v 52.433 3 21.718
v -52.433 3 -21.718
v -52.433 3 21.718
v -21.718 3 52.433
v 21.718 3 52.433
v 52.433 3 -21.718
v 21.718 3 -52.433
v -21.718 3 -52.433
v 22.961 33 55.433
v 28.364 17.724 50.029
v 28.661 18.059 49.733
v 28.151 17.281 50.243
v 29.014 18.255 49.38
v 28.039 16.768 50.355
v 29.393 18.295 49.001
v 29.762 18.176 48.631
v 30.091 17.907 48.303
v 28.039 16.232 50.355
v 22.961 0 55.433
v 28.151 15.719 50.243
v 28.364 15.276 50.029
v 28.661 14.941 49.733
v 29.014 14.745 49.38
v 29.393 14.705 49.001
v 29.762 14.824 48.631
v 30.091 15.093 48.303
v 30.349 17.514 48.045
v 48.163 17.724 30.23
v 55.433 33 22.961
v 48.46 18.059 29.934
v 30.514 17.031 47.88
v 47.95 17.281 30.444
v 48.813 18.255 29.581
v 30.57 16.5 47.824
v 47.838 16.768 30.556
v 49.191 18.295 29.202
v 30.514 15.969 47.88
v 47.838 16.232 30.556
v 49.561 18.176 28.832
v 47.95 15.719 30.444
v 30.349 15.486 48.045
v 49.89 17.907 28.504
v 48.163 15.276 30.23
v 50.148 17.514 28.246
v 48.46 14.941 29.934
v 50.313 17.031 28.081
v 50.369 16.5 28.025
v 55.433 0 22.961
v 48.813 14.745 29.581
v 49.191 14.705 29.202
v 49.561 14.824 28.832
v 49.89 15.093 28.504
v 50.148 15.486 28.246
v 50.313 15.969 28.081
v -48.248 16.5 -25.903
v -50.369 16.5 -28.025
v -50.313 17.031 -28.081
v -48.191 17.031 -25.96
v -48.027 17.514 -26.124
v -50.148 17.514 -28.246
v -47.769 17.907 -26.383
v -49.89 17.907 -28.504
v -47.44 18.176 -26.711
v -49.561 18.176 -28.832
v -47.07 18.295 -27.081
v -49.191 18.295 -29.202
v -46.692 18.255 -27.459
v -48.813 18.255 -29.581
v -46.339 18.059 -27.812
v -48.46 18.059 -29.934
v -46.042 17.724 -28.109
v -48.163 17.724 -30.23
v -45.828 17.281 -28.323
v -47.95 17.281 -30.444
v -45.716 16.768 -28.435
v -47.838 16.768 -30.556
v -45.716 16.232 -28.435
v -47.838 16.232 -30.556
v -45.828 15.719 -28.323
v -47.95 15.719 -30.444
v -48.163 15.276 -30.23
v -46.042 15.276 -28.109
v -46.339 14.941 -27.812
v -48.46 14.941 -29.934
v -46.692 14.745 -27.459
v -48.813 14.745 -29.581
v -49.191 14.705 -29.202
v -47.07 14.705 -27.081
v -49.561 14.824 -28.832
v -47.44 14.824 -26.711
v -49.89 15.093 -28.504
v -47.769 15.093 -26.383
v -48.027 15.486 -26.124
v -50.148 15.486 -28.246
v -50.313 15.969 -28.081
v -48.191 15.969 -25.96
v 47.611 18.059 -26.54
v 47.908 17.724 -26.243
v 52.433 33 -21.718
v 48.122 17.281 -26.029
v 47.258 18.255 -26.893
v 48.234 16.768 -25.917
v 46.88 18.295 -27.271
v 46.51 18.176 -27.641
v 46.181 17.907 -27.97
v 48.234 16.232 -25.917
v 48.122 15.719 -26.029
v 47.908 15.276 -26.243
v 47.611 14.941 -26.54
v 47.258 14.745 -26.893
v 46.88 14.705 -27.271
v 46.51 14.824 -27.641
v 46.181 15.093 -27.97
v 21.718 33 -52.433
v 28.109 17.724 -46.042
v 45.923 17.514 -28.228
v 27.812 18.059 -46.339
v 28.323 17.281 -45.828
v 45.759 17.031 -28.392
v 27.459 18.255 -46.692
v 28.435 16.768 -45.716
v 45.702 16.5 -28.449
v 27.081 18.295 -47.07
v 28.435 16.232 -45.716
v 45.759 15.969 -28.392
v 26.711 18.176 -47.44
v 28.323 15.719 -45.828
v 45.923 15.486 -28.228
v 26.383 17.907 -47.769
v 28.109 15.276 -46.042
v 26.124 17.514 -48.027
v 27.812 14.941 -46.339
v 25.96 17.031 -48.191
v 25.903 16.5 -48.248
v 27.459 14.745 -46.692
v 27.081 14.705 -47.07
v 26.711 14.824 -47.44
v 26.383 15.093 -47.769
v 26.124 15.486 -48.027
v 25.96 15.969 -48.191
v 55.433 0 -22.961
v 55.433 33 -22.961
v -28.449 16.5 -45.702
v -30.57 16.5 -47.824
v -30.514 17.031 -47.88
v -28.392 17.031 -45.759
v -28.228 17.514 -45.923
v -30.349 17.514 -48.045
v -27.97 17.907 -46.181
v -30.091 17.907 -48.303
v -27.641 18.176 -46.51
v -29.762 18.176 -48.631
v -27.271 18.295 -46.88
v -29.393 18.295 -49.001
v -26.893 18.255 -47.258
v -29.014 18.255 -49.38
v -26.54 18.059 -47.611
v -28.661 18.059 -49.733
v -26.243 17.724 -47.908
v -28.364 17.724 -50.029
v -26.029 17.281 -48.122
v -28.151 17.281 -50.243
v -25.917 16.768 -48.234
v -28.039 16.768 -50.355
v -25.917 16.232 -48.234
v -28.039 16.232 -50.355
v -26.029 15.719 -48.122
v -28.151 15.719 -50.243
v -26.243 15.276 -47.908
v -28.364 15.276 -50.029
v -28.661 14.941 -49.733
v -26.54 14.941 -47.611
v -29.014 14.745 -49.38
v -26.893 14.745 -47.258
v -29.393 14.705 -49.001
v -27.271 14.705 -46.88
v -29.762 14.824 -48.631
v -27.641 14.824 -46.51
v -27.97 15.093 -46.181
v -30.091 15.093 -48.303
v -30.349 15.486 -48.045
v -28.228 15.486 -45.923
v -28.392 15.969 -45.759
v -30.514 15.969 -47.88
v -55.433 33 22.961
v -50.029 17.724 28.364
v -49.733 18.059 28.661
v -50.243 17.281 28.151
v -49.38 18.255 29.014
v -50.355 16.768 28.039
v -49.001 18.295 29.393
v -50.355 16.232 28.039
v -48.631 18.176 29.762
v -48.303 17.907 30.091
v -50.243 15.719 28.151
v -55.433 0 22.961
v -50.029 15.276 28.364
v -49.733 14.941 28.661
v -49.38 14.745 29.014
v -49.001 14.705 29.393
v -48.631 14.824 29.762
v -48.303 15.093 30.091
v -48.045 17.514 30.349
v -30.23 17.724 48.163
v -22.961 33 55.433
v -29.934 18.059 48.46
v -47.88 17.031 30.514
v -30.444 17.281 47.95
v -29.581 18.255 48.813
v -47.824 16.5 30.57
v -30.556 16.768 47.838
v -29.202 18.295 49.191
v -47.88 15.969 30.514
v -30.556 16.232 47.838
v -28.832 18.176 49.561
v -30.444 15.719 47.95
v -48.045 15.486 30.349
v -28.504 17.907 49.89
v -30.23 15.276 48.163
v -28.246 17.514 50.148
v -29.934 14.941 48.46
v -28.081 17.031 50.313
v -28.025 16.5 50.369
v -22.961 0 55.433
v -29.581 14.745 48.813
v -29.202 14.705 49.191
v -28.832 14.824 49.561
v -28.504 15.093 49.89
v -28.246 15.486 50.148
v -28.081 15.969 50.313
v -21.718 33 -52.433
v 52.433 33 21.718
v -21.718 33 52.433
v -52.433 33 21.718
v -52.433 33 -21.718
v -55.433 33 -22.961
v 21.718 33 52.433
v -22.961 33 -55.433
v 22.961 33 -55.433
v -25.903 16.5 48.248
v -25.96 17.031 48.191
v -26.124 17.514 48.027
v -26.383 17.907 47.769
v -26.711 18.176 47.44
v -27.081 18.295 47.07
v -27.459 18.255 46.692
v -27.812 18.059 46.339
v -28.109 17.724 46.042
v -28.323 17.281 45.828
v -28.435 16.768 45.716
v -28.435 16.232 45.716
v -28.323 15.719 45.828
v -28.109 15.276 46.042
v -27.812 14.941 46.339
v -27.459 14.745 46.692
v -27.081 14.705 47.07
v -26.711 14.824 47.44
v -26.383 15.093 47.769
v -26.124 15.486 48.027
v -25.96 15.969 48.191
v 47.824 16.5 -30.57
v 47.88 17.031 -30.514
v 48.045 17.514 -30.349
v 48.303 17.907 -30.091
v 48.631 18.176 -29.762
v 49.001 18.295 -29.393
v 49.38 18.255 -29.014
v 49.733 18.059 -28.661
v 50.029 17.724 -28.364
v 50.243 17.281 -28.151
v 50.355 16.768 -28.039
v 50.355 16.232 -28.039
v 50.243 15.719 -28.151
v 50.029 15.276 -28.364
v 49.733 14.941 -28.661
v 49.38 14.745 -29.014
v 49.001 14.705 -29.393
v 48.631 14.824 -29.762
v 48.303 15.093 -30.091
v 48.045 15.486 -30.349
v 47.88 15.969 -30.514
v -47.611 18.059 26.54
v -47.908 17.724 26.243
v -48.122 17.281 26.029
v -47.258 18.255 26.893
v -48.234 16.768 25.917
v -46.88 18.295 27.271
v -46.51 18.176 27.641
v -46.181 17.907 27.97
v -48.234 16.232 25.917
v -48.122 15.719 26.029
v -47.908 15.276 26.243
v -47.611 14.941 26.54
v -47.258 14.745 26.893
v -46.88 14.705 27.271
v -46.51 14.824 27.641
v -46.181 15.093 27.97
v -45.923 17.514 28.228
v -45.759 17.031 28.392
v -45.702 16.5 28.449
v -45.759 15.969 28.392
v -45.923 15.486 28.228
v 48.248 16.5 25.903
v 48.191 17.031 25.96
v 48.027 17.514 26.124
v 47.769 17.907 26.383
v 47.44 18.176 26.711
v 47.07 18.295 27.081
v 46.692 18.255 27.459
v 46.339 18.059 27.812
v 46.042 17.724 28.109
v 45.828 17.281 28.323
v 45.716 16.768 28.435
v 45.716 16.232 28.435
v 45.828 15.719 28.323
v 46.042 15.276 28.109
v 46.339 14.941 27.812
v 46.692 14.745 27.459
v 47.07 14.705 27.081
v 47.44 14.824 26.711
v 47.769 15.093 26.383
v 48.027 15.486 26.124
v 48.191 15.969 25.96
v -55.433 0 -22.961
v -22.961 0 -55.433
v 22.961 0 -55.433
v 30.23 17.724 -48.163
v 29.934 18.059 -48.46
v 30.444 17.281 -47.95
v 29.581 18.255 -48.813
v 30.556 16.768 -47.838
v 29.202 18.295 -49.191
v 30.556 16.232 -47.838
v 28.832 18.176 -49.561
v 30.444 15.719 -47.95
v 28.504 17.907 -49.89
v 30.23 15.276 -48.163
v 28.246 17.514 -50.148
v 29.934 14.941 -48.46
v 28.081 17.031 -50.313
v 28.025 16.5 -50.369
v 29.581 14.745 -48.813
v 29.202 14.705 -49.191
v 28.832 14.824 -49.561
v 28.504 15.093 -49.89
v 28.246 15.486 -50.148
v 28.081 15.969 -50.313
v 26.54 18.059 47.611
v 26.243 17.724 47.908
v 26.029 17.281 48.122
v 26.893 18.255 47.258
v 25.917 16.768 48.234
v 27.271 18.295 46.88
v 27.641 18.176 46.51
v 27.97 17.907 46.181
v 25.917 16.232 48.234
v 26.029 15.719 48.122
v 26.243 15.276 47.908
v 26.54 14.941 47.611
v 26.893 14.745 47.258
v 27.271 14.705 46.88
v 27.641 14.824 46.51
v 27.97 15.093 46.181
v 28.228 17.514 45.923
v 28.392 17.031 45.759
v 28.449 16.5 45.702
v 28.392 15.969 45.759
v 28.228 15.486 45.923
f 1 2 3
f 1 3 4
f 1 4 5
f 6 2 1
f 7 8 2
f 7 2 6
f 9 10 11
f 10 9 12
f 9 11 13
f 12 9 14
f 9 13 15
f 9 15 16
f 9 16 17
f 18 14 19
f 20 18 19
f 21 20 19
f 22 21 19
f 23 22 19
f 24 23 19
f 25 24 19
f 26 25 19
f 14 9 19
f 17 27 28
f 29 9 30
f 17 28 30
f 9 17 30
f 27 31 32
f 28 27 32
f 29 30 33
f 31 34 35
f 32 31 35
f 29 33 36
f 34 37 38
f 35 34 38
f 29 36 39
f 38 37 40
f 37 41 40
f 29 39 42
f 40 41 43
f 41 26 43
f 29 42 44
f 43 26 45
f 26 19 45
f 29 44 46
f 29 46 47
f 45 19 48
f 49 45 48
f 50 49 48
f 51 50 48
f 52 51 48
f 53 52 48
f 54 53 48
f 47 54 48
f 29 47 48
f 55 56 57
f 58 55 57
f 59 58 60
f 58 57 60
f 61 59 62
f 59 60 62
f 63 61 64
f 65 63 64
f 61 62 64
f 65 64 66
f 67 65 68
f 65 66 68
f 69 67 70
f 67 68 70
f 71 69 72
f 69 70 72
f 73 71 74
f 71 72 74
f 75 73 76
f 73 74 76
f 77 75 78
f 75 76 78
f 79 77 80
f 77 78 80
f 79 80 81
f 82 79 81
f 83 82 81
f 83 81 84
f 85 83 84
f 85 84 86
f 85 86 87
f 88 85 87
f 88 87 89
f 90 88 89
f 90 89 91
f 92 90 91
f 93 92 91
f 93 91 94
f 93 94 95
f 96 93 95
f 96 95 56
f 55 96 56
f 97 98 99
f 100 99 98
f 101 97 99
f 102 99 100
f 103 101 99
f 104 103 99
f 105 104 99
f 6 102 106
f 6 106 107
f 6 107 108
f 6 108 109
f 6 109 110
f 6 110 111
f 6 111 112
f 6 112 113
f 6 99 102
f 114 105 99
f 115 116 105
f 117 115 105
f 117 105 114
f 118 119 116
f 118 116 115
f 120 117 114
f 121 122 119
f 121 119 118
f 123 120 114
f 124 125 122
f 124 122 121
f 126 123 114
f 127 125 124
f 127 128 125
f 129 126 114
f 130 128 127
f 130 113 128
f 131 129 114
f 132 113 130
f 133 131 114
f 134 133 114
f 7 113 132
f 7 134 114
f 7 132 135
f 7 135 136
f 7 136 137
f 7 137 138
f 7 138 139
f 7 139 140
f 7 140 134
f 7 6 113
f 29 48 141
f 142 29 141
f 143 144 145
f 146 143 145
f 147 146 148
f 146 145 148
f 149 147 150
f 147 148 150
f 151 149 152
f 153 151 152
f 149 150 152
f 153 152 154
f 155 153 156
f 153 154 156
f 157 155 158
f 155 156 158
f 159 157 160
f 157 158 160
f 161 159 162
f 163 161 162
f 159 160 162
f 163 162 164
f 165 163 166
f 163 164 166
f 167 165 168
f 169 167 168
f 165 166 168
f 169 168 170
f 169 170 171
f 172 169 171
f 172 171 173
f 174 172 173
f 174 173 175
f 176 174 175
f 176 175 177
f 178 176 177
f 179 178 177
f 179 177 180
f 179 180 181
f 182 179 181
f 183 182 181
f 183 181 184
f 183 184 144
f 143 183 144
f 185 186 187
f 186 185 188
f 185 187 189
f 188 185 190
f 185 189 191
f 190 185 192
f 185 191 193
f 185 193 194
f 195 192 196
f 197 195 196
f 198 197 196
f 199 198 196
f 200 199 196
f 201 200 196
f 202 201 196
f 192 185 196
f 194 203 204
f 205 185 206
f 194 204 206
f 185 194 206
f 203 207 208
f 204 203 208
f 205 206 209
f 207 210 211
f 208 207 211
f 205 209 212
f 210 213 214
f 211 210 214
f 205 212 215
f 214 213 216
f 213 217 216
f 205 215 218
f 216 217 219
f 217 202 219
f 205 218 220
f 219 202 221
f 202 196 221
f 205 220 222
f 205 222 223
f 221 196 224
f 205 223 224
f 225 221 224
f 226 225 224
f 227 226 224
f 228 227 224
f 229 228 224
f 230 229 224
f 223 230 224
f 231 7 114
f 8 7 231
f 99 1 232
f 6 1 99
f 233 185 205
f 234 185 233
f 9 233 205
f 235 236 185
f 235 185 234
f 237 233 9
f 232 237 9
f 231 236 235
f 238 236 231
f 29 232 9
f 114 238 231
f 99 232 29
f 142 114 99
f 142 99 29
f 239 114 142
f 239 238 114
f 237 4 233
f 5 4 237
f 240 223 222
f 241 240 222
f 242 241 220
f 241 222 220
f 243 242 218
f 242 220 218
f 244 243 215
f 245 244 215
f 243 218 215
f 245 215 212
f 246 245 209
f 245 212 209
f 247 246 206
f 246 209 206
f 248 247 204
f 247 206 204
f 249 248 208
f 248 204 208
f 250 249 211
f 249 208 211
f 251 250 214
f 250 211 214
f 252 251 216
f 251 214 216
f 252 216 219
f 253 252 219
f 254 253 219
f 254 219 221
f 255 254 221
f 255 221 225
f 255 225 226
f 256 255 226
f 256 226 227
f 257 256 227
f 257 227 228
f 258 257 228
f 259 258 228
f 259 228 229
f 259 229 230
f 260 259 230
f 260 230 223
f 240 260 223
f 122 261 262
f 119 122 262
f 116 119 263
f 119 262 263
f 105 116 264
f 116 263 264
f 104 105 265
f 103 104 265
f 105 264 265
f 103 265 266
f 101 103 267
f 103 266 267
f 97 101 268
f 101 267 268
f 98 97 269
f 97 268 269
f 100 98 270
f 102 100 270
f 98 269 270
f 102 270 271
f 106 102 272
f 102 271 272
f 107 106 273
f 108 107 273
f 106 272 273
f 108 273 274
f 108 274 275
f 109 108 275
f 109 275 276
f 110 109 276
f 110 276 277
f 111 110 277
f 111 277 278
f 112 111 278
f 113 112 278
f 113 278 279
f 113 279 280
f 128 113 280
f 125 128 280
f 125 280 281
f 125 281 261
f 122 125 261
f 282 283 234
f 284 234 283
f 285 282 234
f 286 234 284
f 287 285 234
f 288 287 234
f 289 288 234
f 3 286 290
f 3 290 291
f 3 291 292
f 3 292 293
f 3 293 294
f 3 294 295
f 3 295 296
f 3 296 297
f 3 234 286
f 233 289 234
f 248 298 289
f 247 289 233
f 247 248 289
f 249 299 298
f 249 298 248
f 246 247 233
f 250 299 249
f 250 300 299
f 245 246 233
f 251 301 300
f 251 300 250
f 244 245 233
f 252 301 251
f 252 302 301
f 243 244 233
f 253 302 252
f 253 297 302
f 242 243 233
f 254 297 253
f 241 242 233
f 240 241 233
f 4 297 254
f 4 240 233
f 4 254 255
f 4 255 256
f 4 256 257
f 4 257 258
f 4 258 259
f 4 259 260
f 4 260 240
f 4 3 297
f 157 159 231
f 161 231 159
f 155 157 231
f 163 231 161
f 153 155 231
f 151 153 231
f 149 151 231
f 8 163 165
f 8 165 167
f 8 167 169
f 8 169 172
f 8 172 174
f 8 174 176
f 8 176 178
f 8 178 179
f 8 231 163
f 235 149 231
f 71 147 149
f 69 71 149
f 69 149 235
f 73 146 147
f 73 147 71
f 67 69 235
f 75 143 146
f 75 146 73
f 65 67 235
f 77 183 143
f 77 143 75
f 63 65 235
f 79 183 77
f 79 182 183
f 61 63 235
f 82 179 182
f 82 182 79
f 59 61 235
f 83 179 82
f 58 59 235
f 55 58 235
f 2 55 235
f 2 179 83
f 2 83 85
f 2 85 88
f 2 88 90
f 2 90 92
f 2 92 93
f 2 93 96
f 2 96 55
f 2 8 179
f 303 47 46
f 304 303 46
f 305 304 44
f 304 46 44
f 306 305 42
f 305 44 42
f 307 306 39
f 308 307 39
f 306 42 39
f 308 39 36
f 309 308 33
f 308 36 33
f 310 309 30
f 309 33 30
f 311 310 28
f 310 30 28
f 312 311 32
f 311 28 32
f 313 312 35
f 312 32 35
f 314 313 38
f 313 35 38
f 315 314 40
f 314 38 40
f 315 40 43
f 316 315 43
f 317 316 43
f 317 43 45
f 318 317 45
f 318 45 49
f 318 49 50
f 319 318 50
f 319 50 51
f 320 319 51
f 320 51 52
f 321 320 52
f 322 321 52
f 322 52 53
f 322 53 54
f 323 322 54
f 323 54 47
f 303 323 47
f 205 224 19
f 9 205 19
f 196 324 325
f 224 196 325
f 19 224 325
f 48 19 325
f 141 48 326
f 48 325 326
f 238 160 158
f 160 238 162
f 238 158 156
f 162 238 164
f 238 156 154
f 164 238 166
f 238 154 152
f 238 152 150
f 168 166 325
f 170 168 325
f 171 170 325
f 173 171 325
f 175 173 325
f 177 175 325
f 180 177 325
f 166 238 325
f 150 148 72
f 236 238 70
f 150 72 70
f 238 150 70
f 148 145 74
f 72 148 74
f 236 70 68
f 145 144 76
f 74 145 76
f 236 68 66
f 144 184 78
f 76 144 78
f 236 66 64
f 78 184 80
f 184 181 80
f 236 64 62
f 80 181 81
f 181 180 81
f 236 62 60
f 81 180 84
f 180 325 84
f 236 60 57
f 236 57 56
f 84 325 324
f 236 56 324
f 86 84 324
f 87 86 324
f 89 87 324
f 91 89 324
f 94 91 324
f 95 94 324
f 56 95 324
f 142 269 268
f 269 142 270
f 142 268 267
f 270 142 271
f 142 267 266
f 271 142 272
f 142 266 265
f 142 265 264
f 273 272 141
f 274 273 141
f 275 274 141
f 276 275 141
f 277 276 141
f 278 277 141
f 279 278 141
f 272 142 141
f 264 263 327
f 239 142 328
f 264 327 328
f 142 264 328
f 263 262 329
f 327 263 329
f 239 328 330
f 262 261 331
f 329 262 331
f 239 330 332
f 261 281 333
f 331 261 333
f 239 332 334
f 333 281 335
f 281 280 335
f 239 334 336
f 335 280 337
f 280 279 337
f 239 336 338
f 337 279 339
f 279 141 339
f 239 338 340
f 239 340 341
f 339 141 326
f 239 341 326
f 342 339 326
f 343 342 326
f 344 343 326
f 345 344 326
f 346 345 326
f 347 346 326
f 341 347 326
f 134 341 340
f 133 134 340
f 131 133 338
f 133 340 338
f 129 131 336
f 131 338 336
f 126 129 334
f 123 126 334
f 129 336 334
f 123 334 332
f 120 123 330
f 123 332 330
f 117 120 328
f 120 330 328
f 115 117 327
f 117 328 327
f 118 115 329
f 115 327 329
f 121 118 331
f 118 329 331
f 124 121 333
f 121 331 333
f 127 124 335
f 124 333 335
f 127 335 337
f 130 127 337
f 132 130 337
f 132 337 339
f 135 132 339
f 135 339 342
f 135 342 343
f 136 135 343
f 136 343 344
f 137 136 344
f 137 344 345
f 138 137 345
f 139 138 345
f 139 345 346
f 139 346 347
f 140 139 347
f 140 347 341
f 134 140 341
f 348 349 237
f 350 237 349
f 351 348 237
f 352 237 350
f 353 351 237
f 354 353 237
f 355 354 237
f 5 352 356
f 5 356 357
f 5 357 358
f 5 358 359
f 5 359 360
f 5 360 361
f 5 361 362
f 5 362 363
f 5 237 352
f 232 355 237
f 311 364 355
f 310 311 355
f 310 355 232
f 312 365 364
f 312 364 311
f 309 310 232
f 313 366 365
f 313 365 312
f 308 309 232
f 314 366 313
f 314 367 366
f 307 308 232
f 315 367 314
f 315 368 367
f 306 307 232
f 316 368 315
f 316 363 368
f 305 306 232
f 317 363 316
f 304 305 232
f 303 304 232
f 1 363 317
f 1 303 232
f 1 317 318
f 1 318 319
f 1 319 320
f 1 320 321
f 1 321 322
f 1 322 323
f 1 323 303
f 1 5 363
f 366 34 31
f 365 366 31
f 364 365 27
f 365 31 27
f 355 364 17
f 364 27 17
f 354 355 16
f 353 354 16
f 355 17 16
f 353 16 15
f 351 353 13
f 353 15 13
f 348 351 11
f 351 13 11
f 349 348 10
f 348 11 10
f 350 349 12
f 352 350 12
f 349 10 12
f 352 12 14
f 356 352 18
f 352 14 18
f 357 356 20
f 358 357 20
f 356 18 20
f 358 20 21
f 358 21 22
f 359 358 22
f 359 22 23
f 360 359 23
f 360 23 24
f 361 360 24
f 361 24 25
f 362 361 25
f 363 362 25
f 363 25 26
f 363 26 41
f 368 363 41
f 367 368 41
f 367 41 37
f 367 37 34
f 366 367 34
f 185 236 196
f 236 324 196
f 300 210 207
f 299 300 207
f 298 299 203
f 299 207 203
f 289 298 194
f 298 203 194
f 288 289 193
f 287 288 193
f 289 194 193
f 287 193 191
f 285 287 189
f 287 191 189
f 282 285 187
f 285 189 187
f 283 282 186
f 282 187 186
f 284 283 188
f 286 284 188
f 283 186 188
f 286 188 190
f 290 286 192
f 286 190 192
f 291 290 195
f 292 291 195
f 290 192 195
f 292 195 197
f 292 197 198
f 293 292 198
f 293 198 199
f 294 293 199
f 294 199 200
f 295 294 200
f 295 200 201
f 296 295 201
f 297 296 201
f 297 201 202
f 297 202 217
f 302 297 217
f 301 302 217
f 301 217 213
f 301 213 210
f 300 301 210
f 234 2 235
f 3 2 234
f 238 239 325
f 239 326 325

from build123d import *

# Parameters (mm, degrees)
BOSS_EXTRUDE1_DEPTH = 3
BOSS_EXTRUDE2_DEPTH = 30
CUT_EXTRUDE1_REACH  = 139.835
SKETCH3_R           = 1.8
CIRPATTERN1_COUNT   = 4


with BuildPart() as part:
    # Sketch1 → Boss-Extrude1 (new body)
    with BuildSketch(Plane(origin=(0, 0, 0), x_dir=(1, 0, 0), z_dir=(0, 1, 0))):
        Polygon((55.432771951, 22.961005942), (22.961005942, 55.432771951), (-22.961005942, 55.432771951), (-55.432771951, 22.961005942), (-55.432771951, -22.961005942), (-22.961005942, -55.432771951), (22.961005942, -55.432771951), (55.432771951, -22.961005942), align=None)
    extrude(amount=BOSS_EXTRUDE1_DEPTH)

    # Sketch2 → Boss-Extrude2 (add)
    with BuildSketch(Plane(origin=(0, 3, 0), x_dir=(1, 0, 0), z_dir=(0, 1, 0))):
        Polygon((55.432771951, -22.961005942), (55.432771951, 22.961005942), (22.961005942, 55.432771951), (-22.961005942, 55.432771951), (-55.432771951, 22.961005942), (-55.432771951, -22.961005942), (-22.961005942, -55.432771951), (22.961005942, -55.432771951), align=None)
        Polygon((52.432771951, -21.718365255), (52.432771951, 21.718365255), (21.718365255, 52.432771951), (-21.718365255, 52.432771951), (-52.432771951, 21.718365255), (-52.432771951, -21.718365255), (-21.718365255, -52.432771951), (21.718365255, -52.432771951), align=None, mode=Mode.SUBTRACT)
    extrude(amount=BOSS_EXTRUDE2_DEPTH)

    # Sketch3 → Cut-Extrude1 (cut, up to next)
    with BuildSketch(Plane(origin=(39.196888946, 0, 39.196888946), x_dir=(0.7071067811865475, 0, -0.7071067811865477), z_dir=(0.7071067811865477, 0, 0.7071067811865475)), mode=Mode.PRIVATE) as cut_extrude1_sk1:
        with Locations((-14, 16.5)):
            Circle(SKETCH3_R)
    cut_extrude1_tool1 = extrude(cut_extrude1_sk1.sketch, amount=-CUT_EXTRUDE1_REACH, mode=Mode.PRIVATE) & part.part
    # Sketch3 → Cut-Extrude1 (cut, up to next)
    with BuildSketch(Plane(origin=(39.196888946, 0, 39.196888946), x_dir=(0.7071067811865475, 0, -0.7071067811865477), z_dir=(0.7071067811865477, 0, 0.7071067811865475)), mode=Mode.PRIVATE) as cut_extrude1_sk2:
        with Locations((14, 16.5)):
            Circle(SKETCH3_R)
    cut_extrude1_tool2 = extrude(cut_extrude1_sk2.sketch, amount=-CUT_EXTRUDE1_REACH, mode=Mode.PRIVATE) & part.part
    cut_extrude1_1 = cut_extrude1_tool1.solids().sort_by_distance((29.297394, 16.5, 49.096384))[0]
    add(cut_extrude1_1, mode=Mode.SUBTRACT)
    cut_extrude1_2 = cut_extrude1_tool2.solids().sort_by_distance((49.096384, 16.5, 29.297394))[0]
    add(cut_extrude1_2, mode=Mode.SUBTRACT)
    cut_extrude1 = cut_extrude1_1 + cut_extrude1_2  # Cut-Extrude1 as one shape, for the pattern or mirror that repeats it

    # CirPattern1: Cut-Extrude1 ×4 about axis
    cirpattern1_axis = Axis((0, 0, 0), (0, 1, 0))
    for i in range(1, CIRPATTERN1_COUNT):
        add(cut_extrude1.rotate(cirpattern1_axis, i * 360 / CIRPATTERN1_COUNT), mode=Mode.SUBTRACT)


solid = part.part
